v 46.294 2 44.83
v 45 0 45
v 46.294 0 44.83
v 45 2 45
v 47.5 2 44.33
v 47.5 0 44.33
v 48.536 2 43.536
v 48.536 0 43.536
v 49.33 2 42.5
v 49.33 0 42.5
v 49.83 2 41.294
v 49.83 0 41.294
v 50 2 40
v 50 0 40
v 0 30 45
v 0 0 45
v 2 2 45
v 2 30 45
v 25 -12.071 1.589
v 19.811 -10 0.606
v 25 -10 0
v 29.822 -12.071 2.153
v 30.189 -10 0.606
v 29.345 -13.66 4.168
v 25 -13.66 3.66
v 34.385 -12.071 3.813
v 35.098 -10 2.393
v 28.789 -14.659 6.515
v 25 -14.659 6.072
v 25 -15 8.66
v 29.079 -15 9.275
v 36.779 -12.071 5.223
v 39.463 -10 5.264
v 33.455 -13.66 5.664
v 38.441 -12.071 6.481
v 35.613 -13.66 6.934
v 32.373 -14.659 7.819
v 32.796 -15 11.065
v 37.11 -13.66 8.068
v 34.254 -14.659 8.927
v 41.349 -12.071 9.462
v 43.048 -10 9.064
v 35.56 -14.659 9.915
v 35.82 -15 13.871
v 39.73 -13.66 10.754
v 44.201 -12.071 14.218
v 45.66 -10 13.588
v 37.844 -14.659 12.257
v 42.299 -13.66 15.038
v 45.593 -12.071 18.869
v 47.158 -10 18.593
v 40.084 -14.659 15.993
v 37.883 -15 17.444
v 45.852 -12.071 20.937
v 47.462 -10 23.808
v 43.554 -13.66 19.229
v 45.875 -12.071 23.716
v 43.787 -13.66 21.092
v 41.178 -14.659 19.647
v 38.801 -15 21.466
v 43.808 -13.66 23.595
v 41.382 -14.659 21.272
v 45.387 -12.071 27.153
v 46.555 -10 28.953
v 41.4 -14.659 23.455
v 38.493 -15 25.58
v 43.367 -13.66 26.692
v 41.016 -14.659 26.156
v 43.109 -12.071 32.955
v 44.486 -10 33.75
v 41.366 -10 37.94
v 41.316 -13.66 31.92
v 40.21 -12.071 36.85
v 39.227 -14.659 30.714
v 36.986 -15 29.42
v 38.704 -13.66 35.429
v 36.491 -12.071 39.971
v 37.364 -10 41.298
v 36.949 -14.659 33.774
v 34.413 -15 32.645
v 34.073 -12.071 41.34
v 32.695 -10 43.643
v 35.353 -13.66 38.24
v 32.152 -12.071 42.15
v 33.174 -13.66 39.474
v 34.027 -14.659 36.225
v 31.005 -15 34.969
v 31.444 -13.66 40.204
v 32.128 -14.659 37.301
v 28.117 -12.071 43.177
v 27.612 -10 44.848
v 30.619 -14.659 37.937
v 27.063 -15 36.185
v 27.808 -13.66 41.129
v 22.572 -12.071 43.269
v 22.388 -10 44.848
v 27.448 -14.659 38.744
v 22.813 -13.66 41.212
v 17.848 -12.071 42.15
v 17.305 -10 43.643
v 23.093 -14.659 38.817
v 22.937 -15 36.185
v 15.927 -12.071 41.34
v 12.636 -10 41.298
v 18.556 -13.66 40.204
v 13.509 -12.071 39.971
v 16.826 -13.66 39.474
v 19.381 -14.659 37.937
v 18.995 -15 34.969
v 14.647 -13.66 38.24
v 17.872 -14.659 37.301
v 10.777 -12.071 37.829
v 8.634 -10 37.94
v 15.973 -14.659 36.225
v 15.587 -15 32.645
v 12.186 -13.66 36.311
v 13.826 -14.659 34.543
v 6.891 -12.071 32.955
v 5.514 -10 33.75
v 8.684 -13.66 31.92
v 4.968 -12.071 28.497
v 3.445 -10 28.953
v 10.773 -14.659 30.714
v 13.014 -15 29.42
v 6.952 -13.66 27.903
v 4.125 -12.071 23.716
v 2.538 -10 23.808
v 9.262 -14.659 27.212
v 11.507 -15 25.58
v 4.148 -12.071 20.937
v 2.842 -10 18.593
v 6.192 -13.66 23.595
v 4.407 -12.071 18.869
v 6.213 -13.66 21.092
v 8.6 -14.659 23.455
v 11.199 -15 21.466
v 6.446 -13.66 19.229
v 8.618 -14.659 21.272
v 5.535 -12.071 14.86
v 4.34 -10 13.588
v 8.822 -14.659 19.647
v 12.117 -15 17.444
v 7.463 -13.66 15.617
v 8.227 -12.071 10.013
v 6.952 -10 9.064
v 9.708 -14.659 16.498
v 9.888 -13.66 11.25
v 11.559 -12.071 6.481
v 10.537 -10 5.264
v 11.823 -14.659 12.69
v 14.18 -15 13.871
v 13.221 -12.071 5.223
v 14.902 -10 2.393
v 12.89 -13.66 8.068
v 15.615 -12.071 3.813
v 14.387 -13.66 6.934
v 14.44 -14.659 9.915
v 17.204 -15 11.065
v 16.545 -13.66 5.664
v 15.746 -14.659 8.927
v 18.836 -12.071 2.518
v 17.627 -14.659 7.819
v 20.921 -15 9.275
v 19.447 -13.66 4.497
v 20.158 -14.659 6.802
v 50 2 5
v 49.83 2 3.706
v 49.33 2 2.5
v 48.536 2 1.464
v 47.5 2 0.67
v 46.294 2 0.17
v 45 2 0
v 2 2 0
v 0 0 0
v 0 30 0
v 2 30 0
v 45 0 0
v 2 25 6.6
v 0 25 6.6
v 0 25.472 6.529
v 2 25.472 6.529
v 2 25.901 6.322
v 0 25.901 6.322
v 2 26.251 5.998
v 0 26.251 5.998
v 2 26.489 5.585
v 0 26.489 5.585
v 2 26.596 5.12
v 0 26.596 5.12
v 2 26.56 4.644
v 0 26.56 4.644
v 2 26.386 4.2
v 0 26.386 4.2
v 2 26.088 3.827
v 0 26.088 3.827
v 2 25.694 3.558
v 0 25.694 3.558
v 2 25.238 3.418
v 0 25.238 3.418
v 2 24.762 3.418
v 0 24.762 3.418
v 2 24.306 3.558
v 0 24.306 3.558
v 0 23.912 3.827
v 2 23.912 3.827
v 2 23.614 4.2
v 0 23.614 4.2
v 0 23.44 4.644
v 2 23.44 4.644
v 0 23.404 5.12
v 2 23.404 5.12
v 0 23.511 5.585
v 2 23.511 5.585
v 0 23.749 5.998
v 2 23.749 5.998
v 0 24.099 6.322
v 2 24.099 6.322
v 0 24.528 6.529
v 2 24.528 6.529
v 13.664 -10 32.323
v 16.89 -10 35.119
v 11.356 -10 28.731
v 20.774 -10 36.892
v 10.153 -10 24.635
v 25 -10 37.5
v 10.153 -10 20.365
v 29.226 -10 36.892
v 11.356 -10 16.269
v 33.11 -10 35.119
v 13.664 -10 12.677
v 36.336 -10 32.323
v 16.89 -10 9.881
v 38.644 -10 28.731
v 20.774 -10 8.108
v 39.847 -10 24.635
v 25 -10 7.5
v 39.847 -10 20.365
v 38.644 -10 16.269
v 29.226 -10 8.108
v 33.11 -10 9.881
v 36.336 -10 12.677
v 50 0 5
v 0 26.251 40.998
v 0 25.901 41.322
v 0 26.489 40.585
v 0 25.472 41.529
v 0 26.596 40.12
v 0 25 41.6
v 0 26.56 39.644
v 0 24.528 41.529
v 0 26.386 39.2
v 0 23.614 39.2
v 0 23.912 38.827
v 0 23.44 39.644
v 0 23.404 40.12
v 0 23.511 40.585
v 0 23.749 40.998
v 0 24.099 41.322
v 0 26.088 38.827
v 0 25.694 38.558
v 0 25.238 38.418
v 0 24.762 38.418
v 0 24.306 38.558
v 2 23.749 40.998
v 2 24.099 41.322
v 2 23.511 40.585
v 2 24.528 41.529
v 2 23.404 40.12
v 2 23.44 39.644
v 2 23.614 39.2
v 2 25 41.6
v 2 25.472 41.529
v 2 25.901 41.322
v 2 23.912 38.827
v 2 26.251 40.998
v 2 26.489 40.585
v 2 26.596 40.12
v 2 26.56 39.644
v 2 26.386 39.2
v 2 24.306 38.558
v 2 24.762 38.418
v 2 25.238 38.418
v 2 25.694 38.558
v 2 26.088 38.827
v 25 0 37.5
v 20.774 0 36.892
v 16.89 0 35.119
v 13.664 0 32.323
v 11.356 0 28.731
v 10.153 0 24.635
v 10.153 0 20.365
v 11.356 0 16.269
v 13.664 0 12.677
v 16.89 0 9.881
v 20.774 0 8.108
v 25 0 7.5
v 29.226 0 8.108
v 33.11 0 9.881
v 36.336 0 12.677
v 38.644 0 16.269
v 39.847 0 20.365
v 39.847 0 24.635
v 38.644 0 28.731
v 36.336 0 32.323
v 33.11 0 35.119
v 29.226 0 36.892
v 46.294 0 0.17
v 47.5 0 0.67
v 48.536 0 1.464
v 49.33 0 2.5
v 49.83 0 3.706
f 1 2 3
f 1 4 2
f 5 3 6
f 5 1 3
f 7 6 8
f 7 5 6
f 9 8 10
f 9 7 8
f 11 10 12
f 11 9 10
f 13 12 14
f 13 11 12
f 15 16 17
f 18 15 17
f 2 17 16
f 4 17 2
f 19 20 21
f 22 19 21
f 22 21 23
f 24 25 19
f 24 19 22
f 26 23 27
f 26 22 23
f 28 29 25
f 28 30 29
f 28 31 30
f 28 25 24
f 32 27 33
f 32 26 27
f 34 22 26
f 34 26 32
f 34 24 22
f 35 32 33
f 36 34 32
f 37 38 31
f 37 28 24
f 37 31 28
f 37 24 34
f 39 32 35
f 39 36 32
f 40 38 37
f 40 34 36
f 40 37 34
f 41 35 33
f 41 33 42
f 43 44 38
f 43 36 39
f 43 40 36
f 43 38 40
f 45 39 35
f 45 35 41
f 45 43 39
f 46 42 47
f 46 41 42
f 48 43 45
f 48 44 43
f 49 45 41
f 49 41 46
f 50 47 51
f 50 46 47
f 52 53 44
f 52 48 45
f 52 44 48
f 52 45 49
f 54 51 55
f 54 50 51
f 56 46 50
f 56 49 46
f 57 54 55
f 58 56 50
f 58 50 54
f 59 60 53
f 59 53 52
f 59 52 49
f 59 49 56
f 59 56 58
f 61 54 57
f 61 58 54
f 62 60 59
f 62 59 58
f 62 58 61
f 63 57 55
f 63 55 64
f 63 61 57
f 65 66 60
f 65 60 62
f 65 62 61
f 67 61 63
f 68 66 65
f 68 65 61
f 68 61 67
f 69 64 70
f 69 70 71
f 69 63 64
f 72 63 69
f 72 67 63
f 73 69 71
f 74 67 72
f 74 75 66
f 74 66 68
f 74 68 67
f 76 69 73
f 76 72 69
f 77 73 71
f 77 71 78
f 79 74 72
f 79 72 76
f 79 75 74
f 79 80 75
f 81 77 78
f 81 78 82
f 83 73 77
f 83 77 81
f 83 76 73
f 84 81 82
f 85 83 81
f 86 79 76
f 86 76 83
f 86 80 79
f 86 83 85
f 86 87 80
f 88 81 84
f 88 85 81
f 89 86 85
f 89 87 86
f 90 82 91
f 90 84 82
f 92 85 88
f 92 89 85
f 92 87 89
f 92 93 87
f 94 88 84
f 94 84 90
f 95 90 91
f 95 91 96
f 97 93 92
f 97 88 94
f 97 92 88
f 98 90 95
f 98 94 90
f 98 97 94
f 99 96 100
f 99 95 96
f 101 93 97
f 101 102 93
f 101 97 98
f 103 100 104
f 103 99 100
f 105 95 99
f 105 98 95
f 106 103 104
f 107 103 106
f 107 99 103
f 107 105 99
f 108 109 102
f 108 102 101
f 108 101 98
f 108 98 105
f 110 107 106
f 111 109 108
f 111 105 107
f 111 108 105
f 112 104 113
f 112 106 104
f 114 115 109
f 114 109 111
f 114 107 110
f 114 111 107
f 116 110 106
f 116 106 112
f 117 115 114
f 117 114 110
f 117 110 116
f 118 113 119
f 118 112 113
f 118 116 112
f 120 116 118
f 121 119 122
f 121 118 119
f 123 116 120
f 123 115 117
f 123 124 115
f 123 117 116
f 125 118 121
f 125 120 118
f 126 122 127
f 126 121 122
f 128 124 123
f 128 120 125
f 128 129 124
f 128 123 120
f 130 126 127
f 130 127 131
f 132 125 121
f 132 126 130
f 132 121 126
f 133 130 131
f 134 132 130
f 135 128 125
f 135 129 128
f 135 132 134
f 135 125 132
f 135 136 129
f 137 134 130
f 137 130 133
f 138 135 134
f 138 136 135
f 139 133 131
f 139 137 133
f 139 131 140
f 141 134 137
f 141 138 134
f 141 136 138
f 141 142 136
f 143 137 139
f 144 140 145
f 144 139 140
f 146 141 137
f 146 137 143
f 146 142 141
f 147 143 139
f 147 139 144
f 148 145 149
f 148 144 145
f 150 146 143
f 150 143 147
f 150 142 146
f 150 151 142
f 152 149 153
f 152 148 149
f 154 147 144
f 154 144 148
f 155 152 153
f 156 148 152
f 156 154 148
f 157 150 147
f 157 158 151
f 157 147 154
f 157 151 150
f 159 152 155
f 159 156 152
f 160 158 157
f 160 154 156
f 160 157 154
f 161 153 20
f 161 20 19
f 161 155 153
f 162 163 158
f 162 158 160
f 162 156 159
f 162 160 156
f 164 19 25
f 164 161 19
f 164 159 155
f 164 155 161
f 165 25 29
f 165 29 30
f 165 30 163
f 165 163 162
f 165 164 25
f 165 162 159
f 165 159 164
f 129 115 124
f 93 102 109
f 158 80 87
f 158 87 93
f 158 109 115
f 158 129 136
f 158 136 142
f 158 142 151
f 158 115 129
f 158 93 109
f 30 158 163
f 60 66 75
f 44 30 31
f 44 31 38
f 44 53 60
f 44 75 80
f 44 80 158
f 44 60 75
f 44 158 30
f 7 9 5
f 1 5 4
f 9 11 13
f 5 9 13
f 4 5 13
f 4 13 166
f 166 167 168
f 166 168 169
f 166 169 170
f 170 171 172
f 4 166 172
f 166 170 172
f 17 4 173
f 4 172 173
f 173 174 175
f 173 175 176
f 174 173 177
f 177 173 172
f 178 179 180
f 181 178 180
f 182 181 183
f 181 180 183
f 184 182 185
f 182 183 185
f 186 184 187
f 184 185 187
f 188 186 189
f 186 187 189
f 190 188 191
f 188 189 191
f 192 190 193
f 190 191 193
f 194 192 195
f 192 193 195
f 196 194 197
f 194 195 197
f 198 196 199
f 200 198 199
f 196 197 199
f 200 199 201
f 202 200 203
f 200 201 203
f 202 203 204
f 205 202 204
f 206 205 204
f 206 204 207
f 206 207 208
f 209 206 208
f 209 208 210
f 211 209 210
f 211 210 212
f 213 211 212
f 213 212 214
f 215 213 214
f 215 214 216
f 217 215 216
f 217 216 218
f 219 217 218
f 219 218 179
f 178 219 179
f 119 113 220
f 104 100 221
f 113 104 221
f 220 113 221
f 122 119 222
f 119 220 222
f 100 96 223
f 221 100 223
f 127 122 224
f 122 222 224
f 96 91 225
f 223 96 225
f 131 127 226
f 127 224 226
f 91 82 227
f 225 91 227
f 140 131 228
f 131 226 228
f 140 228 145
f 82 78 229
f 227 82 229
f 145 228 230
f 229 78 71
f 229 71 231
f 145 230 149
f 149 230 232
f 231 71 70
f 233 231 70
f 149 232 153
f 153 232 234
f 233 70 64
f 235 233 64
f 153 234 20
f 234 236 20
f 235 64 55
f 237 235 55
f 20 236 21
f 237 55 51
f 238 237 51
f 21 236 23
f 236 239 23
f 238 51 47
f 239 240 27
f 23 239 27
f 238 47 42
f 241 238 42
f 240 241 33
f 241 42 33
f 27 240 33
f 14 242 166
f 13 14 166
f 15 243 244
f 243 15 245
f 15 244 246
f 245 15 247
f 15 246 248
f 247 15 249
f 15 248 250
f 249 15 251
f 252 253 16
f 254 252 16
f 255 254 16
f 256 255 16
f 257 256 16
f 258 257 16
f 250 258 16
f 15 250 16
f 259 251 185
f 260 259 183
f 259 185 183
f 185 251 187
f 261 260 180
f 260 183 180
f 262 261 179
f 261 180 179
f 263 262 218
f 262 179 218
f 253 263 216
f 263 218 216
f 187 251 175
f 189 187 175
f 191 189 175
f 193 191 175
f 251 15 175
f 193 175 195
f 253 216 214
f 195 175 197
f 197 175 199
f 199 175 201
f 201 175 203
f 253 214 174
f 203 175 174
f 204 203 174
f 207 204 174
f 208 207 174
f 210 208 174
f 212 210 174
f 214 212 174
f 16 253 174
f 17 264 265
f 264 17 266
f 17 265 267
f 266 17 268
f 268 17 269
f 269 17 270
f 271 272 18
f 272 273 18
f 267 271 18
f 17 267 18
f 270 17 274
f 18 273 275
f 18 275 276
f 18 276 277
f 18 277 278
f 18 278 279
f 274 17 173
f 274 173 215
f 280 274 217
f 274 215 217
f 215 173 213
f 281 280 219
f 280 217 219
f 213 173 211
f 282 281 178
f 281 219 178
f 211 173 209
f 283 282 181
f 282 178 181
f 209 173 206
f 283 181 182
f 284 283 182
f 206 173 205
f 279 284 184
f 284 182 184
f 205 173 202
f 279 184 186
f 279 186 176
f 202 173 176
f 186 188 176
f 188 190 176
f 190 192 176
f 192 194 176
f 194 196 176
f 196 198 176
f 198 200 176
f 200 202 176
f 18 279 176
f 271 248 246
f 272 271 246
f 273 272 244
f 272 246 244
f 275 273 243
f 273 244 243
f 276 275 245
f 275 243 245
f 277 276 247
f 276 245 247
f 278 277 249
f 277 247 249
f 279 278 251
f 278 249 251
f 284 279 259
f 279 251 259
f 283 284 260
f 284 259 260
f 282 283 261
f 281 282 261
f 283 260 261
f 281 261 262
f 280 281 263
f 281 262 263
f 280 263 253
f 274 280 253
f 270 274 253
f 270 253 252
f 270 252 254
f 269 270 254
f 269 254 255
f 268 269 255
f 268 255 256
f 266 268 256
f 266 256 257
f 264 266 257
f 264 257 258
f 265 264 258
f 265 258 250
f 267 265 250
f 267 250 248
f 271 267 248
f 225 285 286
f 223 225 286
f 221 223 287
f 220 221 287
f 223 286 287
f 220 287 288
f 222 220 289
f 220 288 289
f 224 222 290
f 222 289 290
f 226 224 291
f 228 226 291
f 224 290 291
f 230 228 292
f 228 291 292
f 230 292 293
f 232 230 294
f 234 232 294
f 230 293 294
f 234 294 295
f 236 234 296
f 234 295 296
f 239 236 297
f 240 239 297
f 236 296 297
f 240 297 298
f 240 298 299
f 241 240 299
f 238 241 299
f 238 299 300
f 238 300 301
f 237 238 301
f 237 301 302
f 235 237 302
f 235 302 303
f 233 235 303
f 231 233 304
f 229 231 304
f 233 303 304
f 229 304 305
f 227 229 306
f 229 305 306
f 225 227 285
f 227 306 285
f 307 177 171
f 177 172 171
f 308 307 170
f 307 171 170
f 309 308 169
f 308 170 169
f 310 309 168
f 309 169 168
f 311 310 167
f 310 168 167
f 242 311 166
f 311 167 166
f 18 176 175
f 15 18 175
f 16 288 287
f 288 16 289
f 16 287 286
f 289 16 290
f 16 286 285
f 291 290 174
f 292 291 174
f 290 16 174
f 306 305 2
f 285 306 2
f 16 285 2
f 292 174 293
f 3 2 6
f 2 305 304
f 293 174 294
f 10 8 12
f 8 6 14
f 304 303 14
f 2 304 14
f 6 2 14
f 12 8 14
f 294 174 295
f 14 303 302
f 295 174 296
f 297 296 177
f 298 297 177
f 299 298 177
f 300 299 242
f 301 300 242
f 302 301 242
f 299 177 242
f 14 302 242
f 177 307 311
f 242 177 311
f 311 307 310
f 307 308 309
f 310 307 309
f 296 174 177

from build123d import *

# Parameters (mm, degrees)
EXTRUDE_1_DEPTH     = 45
SKETCH_2_R          = 1.6
CUT_EXTRUDE_1_DEPTH = 35
FILLET_1_R          = 5
SKETCH_3_R          = 15
EXTRUDE_2_DEPTH     = 10
SKETCH_7_R          = 22.5
EXTRUDE_3_DEPTH     = 5
FILLET_2_R          = 10


with BuildPart() as part:
    # ｽｹｯﾁ1 → ﾎﾞｽ - 押し出し1 (new body)
    with BuildSketch(Plane.XY):
        Polygon((0, 30), (0, 0), (50, 0), (50, 2), (2, 2), (2, 30), align=None)
    extrude(amount=EXTRUDE_1_DEPTH)

    # ｽｹｯﾁ2 → ｶｯﾄ - 押し出し1 (cut)
    with BuildSketch(Plane.ZY):
        with Locations((40, 25)):
            Circle(SKETCH_2_R)
        with Locations((5, 25)):
            Circle(SKETCH_2_R)
    extrude(amount=-CUT_EXTRUDE_1_DEPTH, mode=Mode.SUBTRACT)

    # ﾌｨﾚｯﾄ1
    fillet_1_edges = [part.edges().sort_by_distance(p)[0] for p in [
        (50, 1, 45),
        (50, 1, 0),
    ]]
    fillet(fillet_1_edges, radius=FILLET_1_R)

    # ｽｹｯﾁ3 → ﾎﾞｽ - 押し出し2 (add)
    with BuildSketch(Plane.XZ):
        with Locations(Location((25, 22.5, 0), (0, 0, 90))):
            Circle(SKETCH_3_R)
    extrude(amount=EXTRUDE_2_DEPTH)

    # ｽｹｯﾁ7 → ﾎﾞｽ - 押し出し3 (add)
    with BuildSketch(Plane(origin=(0, -10, 0), x_dir=(-1, 0, 0), z_dir=(0, -1, 0))):
        with Locations(Location((-25, -22.5, 0), (0, 0, 90))):
            Circle(SKETCH_7_R)
    extrude(amount=EXTRUDE_3_DEPTH)

    # ﾌｨﾚｯﾄ2
    # the kernel refuses this fillet: 10 mm, written as the material it takes off along each edge
    with BuildSketch(Plane(origin=(25, -15, 22.5), x_dir=(0, 0, -1), z_dir=(-1, 0, 0))) as fillet_2_piece_1:
        with BuildLine():
            CenterArc((13.839745962, -10), FILLET_2_R, 30, 60)
            Line((13.839745962, 0), (13.839745962, 0.2))
            Line((13.839745962, 0.2), (22.5, 0.2))
            Line((22.5, 0.2), (22.7, 0))
            ThreePointArc((22.7, 0), (22.7, -2.5), (22.673205081, -4.9))
            Line((22.673205081, -4.9), (22.5, -5))
        make_face()
    revolve(axis=Axis((25, -15, 22.5), (0, -1, 0)), mode=Mode.SUBTRACT)


solid = part.part
